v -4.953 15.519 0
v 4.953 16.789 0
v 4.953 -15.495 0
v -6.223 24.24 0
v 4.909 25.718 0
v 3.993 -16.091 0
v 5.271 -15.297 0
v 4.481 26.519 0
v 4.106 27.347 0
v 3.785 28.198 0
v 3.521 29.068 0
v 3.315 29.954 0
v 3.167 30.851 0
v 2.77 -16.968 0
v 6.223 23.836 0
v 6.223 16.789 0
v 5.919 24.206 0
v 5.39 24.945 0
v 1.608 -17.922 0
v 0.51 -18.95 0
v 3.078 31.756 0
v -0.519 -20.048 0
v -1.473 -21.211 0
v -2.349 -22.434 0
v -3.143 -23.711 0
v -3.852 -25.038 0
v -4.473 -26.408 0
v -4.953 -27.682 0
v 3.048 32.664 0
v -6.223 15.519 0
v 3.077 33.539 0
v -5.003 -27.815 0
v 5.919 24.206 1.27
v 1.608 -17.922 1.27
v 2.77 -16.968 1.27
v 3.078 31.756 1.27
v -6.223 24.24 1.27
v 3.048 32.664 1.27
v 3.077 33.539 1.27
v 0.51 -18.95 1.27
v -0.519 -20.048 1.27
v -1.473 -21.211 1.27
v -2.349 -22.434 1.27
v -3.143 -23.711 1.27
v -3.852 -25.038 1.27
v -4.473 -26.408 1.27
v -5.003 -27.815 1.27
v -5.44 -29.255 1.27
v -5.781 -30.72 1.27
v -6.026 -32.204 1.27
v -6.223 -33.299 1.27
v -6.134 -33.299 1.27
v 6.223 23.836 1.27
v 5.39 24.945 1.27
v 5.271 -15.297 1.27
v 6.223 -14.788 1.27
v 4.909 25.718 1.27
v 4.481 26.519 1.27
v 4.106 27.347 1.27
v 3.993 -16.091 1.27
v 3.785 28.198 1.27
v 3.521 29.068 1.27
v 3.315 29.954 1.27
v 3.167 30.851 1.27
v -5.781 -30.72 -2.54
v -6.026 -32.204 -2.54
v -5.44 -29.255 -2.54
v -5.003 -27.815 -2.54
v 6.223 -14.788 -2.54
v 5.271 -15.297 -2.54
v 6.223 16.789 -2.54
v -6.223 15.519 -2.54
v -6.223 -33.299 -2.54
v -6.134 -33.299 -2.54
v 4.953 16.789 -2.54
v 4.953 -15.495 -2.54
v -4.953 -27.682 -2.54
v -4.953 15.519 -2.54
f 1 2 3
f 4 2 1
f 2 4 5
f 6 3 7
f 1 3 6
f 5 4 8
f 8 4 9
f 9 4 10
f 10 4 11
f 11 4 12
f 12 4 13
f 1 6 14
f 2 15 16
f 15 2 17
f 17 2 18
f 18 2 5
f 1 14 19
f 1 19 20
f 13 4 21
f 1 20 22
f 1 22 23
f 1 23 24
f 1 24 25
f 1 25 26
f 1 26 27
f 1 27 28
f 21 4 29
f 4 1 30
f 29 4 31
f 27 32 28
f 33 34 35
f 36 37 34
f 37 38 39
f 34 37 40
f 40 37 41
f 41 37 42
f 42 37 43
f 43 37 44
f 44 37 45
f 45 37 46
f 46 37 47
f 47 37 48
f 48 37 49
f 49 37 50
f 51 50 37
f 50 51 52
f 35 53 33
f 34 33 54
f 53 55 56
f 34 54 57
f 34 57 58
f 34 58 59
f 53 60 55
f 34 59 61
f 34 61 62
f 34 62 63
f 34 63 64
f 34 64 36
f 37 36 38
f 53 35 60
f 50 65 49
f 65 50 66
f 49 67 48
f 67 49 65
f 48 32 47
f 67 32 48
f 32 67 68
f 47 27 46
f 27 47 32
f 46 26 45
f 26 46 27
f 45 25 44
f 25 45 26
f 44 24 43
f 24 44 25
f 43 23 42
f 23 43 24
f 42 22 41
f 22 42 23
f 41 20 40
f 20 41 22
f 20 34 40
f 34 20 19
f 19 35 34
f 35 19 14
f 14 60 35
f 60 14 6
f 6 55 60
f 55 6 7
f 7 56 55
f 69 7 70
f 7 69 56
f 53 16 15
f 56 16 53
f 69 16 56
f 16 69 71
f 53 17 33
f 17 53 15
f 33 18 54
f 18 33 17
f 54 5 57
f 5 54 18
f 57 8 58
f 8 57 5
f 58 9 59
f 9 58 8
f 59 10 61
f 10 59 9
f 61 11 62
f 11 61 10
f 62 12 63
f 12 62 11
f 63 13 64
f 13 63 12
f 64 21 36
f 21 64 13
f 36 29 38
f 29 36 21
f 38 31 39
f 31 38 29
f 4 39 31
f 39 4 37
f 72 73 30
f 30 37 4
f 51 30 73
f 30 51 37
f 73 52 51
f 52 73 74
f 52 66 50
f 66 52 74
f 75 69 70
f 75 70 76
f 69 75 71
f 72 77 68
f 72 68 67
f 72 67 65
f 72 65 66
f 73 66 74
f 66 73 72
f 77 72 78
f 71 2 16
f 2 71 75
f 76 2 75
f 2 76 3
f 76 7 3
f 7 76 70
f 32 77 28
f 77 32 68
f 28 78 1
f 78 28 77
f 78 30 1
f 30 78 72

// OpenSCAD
ViewScale = [0.0254, 0.0254, 0.0254];

module switchCap()
{
    translate([0, 0, 50])
    linear_extrude(400)
    circle(110, $fn=96);

    linear_extrude(50)
    circle(150, $fn=96);
}

module fanCap()
{
    linear_extrude(200)
    difference() {
    circle(895, $fn=96);
    circle(875, $fn=96);
    translate([0, 895, 0])
    square([600, 200], center=true);
    translate([0, -895, 0])
    square([600, 200], center=true);

    translate([895, 0, 0])
    square([200, 600], center=true);
    translate([-895, 0, 0])
    square([200, 600], center=true);
    }

    translate([0, 0, 200])
    linear_extrude(50)
//    difference() {
    circle(895, $fn=96);
//    circle(795, $fn=96);
//    }
}

module wireCap()
{
    linear_extrude(50)
    difference() {
    translate([0, 75, 0])
    square([490, 2772], center=true);
    translate([905-490/2, -(905+2622/2)+830, 0])
    circle(905, $fn=96);
    translate([-300, 2730/2+100, 0])
    rotate([0, 0, 45])
    square(800, center=true);
    translate([667, 2772/2-100, 0])
    circle(547, $fn=96);
    }

    translate([0, 0, -100])
    linear_extrude(100)
    difference() {
    union() {
    translate([-(490-50)/2, -(2622-1922)/2, 0])
    square([50, 1922], center=true);
    translate([(490-50)/2, -(2622-1972)/2, 0])
    square([50, 1972], center=true);
    }
    translate([905-490/2, -(905+2622/2)+830, 0])
    circle(905, $fn=96);
    }
}



scale(ViewScale)
{
    //switchCap();
    //fanCap();
    wireCap();
}
